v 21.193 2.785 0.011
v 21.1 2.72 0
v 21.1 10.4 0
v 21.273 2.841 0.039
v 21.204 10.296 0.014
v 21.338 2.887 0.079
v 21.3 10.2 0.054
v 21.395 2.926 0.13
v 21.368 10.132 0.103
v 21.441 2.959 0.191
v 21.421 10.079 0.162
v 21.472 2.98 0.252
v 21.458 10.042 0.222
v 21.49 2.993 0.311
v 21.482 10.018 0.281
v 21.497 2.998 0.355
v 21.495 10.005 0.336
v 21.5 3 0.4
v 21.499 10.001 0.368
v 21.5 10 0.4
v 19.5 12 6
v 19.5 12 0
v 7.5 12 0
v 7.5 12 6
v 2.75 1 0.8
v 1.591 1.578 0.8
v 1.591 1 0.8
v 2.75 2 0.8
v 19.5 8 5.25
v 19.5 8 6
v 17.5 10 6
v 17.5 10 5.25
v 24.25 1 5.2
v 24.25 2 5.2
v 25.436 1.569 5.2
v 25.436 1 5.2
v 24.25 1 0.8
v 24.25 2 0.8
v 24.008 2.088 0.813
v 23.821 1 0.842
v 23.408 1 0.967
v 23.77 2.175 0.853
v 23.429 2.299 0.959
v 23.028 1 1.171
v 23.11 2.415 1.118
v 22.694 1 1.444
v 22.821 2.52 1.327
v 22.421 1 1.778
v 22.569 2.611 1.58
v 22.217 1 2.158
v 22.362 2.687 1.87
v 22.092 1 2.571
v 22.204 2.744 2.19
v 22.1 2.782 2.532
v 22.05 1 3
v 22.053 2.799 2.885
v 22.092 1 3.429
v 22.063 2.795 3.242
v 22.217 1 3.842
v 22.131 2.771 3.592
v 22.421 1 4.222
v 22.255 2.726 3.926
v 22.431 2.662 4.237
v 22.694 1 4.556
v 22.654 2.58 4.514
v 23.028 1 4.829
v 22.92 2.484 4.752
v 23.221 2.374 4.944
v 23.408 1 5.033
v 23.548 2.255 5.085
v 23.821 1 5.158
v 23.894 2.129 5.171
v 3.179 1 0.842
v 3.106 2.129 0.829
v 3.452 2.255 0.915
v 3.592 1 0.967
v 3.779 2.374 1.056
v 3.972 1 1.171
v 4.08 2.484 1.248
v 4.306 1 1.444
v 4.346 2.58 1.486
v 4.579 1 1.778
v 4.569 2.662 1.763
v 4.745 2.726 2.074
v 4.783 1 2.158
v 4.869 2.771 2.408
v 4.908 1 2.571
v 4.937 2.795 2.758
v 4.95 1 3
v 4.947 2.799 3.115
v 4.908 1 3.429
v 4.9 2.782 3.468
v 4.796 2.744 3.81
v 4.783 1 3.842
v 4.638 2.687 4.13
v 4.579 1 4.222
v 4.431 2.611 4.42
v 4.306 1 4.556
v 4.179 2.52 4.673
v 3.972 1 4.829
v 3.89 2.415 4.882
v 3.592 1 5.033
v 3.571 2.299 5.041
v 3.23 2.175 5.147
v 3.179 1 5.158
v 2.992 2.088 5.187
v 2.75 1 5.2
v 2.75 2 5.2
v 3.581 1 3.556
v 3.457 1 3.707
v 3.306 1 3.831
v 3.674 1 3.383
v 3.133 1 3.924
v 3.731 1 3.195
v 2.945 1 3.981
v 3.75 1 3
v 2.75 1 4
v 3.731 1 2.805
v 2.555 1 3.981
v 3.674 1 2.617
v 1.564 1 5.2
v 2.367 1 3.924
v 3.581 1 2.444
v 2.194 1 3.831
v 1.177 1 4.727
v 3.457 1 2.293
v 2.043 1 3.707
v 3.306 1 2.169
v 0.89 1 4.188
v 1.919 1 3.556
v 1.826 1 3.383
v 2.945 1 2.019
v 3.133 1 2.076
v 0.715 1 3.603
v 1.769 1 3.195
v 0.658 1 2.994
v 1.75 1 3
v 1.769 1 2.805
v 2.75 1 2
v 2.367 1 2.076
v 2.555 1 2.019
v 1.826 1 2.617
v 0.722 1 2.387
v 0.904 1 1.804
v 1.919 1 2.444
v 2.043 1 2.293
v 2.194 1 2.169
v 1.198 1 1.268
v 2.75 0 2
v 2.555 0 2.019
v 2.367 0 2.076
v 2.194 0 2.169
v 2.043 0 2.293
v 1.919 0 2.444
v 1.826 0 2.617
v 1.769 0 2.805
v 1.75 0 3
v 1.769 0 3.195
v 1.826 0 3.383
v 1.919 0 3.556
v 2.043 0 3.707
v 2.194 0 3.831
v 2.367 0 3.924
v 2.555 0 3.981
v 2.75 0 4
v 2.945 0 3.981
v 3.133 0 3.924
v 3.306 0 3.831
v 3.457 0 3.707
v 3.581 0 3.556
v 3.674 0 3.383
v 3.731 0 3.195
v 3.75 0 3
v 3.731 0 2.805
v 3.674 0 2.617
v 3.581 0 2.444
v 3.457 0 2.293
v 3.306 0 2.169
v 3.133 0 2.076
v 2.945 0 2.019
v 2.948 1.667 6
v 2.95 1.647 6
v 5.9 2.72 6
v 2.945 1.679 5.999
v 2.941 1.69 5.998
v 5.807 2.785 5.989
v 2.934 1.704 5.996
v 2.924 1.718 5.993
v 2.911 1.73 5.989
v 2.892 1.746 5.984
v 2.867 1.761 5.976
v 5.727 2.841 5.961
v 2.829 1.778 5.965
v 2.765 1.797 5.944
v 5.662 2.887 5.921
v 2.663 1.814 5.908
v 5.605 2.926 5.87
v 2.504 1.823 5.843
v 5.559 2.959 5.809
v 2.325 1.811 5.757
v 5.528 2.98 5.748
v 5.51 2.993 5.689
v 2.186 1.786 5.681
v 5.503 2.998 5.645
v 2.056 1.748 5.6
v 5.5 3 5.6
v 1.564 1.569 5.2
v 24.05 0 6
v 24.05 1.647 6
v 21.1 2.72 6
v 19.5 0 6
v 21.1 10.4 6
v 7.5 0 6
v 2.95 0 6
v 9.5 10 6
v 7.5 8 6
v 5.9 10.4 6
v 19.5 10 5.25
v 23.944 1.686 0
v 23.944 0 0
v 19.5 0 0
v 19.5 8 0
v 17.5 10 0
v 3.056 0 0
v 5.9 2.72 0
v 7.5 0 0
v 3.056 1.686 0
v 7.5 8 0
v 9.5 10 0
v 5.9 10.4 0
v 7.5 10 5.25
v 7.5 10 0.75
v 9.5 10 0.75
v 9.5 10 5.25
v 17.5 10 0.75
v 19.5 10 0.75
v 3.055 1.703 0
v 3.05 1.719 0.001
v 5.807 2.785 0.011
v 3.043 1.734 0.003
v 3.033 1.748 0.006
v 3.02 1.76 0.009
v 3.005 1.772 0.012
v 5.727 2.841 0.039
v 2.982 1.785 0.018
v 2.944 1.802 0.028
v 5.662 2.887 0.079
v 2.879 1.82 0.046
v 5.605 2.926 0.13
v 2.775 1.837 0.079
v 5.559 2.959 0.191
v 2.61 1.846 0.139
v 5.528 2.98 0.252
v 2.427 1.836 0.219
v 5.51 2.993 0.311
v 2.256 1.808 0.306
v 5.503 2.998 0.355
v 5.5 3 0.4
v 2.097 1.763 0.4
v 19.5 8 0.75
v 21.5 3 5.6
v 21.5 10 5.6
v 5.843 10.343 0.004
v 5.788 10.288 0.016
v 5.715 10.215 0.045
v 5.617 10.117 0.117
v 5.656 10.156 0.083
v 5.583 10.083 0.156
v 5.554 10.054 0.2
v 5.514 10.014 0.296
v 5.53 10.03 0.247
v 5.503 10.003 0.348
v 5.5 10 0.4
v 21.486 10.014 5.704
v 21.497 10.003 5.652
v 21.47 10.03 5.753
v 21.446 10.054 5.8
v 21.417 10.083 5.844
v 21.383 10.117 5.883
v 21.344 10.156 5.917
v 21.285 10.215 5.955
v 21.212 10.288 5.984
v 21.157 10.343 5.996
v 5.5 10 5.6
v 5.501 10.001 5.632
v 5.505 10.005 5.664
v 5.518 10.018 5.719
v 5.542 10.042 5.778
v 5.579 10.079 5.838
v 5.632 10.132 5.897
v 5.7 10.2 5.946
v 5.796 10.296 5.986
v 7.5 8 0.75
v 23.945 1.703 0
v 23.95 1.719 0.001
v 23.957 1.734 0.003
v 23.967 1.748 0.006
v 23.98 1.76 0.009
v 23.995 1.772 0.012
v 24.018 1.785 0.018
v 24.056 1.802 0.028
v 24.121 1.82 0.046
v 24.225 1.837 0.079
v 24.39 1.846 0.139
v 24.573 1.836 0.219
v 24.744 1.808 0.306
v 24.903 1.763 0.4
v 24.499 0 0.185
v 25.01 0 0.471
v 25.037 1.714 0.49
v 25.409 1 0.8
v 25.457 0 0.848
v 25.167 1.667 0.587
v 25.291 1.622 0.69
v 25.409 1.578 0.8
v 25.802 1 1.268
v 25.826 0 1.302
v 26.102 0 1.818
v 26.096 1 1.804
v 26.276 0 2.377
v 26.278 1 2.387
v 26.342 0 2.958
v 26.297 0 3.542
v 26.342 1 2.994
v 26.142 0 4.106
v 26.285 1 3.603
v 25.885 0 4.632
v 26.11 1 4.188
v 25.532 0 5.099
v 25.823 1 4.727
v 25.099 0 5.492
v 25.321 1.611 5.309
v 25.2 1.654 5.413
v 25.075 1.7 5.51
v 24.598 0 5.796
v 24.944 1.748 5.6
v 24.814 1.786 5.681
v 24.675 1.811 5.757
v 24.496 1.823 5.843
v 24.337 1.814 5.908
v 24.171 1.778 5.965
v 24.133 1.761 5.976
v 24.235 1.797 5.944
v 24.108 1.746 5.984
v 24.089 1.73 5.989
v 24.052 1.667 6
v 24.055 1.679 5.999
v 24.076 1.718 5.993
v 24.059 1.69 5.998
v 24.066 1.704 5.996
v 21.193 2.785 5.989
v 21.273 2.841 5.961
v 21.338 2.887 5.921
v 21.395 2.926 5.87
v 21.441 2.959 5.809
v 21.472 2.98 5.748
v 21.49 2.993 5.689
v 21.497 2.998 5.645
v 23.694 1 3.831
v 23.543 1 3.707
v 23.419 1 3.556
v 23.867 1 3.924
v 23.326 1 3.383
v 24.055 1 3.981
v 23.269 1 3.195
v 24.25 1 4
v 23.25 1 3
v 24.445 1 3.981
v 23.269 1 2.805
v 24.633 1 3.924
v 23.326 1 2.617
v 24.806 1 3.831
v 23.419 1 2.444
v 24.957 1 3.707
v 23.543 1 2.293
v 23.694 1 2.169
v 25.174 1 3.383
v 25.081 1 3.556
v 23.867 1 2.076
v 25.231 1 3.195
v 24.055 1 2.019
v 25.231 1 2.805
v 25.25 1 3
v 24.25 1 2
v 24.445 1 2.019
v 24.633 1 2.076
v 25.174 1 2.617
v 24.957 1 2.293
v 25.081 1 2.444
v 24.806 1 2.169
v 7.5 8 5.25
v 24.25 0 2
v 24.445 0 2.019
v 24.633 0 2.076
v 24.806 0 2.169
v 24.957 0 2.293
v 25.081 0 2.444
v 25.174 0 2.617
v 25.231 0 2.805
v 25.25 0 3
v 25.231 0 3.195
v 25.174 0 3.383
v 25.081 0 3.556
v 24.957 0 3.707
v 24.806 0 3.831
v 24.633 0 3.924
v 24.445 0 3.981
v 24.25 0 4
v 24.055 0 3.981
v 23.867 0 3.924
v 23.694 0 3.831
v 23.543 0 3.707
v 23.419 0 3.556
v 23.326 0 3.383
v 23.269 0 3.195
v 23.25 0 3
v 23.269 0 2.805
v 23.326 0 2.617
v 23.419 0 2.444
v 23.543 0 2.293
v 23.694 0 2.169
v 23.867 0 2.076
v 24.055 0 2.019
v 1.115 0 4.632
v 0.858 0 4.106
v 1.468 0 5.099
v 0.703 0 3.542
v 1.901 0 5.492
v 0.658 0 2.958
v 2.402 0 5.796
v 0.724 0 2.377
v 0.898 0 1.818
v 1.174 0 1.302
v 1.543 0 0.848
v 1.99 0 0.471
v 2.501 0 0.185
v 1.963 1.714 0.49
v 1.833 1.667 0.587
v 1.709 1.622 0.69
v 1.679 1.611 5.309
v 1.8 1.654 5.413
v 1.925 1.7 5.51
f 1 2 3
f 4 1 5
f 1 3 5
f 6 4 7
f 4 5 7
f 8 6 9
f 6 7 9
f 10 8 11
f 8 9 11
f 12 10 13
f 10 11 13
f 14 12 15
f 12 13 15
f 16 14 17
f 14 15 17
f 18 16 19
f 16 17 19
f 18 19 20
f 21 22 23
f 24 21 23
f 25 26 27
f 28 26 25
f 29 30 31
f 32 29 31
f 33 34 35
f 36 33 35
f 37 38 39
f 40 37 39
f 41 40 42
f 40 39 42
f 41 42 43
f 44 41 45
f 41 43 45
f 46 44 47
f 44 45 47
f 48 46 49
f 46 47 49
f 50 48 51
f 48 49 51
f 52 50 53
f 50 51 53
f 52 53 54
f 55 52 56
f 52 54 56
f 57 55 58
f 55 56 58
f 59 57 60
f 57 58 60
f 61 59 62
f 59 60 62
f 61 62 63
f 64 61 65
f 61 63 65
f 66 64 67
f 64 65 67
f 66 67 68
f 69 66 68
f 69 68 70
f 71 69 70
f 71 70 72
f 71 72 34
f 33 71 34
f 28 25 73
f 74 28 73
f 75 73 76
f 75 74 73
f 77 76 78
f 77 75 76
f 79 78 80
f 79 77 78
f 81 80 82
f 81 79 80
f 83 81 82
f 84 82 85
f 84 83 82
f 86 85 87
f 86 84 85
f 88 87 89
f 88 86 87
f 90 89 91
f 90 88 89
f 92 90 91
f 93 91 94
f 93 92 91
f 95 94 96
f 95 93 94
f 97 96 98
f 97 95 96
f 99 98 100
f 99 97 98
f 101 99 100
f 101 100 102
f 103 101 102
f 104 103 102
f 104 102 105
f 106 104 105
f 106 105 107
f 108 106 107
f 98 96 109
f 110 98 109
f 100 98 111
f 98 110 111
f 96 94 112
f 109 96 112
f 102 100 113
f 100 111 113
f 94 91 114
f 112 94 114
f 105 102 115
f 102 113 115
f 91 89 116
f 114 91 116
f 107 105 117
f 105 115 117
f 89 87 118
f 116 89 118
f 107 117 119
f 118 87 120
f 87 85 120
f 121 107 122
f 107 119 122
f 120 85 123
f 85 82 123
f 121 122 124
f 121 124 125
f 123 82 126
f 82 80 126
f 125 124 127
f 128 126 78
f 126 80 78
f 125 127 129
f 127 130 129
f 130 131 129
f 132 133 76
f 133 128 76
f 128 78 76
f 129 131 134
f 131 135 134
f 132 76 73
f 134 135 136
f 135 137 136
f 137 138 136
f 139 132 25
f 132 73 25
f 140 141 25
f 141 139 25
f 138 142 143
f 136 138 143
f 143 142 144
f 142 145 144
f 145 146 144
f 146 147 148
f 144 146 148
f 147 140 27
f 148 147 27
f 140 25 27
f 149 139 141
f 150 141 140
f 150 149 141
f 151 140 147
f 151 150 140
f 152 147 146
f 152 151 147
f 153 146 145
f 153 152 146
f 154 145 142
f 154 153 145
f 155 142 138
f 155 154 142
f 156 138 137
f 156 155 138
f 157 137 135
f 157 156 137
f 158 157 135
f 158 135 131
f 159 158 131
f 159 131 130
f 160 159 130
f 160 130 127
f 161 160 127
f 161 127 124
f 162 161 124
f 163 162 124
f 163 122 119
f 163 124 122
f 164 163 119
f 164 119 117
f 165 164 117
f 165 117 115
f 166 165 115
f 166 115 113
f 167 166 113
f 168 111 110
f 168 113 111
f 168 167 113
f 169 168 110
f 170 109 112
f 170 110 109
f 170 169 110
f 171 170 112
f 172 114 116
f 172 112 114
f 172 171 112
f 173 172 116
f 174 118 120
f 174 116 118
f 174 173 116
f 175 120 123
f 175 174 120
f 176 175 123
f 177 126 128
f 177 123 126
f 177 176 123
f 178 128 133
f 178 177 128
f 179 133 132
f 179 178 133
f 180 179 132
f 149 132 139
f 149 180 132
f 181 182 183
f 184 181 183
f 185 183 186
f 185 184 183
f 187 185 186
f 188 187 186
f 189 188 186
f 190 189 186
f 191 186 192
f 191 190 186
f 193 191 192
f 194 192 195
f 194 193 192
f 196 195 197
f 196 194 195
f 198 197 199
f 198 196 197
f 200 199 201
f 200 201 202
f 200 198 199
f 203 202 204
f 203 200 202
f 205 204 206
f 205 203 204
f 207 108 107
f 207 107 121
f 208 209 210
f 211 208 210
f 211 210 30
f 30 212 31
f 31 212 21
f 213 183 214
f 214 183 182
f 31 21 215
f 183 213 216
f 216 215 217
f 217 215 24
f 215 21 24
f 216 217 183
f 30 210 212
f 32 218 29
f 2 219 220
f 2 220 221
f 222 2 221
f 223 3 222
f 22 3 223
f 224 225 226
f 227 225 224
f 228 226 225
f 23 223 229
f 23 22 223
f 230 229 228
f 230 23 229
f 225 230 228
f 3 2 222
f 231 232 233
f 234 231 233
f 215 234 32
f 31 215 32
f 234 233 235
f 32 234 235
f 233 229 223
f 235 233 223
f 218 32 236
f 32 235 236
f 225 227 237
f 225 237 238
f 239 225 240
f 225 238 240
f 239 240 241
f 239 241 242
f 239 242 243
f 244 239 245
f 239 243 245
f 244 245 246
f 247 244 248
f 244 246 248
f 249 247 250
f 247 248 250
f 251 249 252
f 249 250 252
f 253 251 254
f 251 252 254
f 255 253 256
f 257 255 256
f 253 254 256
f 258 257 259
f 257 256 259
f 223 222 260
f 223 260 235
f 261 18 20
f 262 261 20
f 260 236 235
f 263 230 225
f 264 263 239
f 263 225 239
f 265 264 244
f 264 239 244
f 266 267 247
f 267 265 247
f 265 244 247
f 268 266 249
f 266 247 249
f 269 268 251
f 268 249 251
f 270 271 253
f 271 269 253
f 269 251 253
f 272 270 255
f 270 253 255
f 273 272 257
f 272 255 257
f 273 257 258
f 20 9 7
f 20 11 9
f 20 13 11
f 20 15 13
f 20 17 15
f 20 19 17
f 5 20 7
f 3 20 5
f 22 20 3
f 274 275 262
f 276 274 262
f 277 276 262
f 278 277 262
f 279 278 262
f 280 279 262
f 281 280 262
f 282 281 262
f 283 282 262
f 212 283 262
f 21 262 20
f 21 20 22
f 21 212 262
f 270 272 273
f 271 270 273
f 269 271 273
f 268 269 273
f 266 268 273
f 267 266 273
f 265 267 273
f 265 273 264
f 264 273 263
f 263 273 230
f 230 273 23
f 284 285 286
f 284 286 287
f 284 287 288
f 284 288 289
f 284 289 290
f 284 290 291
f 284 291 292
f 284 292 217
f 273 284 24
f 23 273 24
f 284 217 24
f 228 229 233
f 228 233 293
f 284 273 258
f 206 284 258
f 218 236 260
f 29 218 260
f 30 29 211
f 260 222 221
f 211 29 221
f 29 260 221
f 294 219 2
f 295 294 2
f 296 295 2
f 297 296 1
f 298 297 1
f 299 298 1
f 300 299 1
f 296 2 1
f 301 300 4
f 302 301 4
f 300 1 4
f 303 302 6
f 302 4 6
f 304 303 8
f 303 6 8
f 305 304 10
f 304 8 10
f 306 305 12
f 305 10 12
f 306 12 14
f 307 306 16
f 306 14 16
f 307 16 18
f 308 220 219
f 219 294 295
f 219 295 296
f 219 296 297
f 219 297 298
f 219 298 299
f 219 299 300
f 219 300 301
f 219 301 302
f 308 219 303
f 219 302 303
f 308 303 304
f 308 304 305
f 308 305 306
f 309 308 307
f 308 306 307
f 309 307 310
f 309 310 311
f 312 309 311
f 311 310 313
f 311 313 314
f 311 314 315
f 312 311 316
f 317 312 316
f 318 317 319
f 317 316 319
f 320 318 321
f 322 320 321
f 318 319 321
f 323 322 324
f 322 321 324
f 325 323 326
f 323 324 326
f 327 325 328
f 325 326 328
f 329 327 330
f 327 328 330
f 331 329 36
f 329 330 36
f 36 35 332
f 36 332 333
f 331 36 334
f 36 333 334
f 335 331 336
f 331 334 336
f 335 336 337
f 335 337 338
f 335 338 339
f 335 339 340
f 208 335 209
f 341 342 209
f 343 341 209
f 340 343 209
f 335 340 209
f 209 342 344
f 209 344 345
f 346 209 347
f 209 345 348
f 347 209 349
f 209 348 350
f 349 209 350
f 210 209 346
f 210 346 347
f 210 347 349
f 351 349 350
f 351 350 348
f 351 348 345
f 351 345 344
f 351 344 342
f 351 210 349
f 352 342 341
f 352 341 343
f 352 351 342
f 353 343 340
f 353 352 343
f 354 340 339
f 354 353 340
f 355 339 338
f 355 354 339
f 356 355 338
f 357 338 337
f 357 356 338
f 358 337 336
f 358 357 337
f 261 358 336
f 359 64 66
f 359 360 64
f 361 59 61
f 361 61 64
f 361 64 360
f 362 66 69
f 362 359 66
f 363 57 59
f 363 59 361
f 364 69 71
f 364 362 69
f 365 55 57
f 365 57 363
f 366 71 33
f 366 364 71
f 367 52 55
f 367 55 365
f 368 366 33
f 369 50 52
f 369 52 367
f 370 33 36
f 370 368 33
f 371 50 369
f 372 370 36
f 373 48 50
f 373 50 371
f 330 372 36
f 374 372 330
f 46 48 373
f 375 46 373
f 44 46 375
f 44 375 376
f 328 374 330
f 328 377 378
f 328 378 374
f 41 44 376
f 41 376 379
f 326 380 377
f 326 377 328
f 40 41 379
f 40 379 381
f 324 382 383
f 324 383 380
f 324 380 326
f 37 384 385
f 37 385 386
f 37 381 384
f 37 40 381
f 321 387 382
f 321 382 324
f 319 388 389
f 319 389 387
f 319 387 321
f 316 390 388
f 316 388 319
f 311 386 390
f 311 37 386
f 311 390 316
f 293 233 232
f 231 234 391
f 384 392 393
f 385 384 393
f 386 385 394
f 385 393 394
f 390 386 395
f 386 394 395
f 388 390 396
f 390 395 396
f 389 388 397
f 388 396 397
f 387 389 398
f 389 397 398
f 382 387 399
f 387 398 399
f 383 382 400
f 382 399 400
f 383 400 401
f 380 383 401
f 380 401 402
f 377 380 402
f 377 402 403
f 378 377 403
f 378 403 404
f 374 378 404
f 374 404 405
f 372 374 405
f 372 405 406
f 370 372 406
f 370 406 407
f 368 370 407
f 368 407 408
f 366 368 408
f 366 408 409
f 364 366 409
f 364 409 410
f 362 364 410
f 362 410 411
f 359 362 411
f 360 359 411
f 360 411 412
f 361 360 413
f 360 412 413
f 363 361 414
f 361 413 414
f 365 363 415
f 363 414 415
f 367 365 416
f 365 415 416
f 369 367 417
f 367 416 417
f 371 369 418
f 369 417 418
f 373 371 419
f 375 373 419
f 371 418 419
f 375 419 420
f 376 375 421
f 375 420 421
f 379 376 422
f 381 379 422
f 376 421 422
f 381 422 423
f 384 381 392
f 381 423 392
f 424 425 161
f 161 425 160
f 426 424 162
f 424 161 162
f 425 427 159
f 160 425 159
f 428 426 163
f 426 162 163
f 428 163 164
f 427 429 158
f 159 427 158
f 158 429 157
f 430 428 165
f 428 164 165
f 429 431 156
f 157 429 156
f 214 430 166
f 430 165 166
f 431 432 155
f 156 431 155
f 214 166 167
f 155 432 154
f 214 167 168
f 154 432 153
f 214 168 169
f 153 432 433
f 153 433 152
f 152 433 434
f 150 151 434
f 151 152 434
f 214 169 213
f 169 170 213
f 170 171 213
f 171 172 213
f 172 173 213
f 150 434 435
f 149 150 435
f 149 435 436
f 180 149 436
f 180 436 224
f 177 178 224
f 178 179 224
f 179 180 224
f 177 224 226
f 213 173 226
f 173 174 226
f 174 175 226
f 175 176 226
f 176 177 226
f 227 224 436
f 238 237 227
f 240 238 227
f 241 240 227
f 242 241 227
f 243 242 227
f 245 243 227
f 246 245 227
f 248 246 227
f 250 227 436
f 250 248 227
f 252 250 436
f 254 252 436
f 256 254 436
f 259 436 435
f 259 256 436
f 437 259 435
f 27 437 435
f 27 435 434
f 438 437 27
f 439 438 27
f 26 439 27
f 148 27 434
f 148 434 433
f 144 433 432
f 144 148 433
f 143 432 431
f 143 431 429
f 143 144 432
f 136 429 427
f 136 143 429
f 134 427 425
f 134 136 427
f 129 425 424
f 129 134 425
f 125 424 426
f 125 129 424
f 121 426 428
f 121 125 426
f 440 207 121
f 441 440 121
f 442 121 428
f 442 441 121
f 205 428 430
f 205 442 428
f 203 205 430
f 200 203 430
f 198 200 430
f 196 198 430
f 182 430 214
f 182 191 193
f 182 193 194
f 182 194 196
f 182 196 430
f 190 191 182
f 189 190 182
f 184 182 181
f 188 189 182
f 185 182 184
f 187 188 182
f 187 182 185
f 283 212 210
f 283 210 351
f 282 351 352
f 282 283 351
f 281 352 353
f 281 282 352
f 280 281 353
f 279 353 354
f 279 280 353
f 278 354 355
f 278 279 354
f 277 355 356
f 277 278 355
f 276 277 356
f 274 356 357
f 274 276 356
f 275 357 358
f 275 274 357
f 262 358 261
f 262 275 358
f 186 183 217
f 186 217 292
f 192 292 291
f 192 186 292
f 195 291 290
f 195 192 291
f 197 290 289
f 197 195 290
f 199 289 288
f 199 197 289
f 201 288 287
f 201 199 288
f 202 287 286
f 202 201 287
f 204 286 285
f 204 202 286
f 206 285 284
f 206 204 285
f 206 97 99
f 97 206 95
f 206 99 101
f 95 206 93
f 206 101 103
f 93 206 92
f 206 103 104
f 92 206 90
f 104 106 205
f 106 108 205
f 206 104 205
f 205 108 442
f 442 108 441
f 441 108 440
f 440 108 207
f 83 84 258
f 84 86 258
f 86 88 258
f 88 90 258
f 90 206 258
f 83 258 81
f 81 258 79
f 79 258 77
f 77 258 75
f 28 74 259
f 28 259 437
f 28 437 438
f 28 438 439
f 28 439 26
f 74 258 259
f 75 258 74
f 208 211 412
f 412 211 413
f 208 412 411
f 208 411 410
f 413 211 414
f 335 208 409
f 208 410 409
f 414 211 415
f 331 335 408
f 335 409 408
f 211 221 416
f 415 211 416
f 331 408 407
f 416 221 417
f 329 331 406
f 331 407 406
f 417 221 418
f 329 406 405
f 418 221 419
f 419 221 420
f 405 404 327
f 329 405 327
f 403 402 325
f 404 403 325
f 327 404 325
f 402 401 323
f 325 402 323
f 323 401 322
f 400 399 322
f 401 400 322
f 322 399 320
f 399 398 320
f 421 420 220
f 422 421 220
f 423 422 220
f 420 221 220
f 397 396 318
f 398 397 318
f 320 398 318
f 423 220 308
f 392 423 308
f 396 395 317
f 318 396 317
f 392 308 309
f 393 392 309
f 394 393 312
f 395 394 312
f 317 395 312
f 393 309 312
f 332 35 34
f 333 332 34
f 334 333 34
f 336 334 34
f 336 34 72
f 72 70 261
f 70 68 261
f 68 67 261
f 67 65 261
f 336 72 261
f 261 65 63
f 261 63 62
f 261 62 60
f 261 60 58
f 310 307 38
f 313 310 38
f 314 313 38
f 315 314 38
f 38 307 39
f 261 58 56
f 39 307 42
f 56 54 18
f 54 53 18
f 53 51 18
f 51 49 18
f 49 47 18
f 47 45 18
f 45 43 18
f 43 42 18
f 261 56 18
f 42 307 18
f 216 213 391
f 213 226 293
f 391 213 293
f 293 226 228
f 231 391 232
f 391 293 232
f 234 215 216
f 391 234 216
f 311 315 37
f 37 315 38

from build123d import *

# Parameters (mm, degrees)
AUFSATZ_LINEAR_AUSTRAGEN1_DEPTH = 6
SKIZZE4_R                       = 1
SCHNITT_LINEAR_AUSTRAGEN1_DEPTH = 3
SCHNITT_LINEAR_AUSTRAGEN2_DEPTH = 2
VERRUNDUNG1_R                   = 0.4
SCHNITT_LINEAR_AUSTRAGEN4_DEPTH = 3
AUFSATZ_LINEAR_AUSTRAGEN2_DEPTH = 0.75
SCHNITT_LINEAR_AUSTRAGEN5_DEPTH = 6


with BuildPart() as part:
    # Skizze1 → Aufsatz-Linear austragen1 (new body)
    with BuildSketch(Plane.XY):
        Polygon((0, 0), (7.5, 0), (7.5, 10), (19.5, 10), (19.5, 0), (27, 0), (27, 1), (21.5, 3), (21.5, 12), (5.5, 12), (5.5, 3), (0, 1), align=None)
    extrude(amount=AUFSATZ_LINEAR_AUSTRAGEN1_DEPTH)

    # Skizze4 → Schnitt-Linear austragen1 (cut)
    with BuildSketch(Plane.XZ):
        with Locations(Location((24.25, 3, 0), (0, 0, 270))):
            Circle(SKIZZE4_R)
    schnitt_linear_austragen1 = extrude(amount=-SCHNITT_LINEAR_AUSTRAGEN1_DEPTH, mode=Mode.SUBTRACT)

    # Skizze5 → Schnitt-Linear austragen2 (cut)
    with BuildSketch(Plane(origin=(0, 3, 0), x_dir=(-1, 0, 0), z_dir=(0, -1, 0))):
        with BuildLine():
            Line((-24.25, -5.2), (-27, -5.2))
            Line((-27, -5.2), (-27, -0.8))
            Line((-27, -0.8), (-24.25, -0.8))
            ThreePointArc((-24.25, -0.8), (-22.05, -3), (-24.25, -5.2))
        make_face()
    schnitt_linear_austragen2 = extrude(amount=SCHNITT_LINEAR_AUSTRAGEN2_DEPTH, mode=Mode.SUBTRACT)

    # Spiegeln1: Schnitt-Linear austragen1, Schnitt-Linear austragen2 across plane
    add(schnitt_linear_austragen1.mirror(Plane(origin=(13.5, 0, 0), x_dir=(0, 0, 1), z_dir=(1, 0, 0))), mode=Mode.SUBTRACT)
    add(schnitt_linear_austragen2.mirror(Plane(origin=(13.5, 0, 0), x_dir=(0, 0, 1), z_dir=(1, 0, 0))), mode=Mode.SUBTRACT)

    # Verrundung1
    verrundung1_edges = [part.edges().sort_by_distance(p)[0] for p in [
        (2.75, 2, 0),
        (5.5, 7.5, 0),
        (21.5, 7.5, 0),
        (24.25, 2, 0),
        (24.25, 2, 6),
        (21.5, 7.5, 6),
        (5.5, 7.5, 6),
        (2.75, 2, 6),
    ]]
    fillet(verrundung1_edges, radius=VERRUNDUNG1_R)

    # Skizze7 → Schnitt-Linear austragen4 (cut)
    with BuildSketch(Plane(origin=(0, 3, 0), x_dir=(-1, 0, 0), z_dir=(0, -1, 0))):
        with BuildLine():
            Line((-24.05, -6), (-27.346568129, -6))
            Line((-27.346568129, -6), (-27.346568129, 0))
            Line((-27.346568129, 0), (-23.943800363, 0))
            ThreePointArc((-23.943800363, 0), (-26.341645128, -2.958498156), (-24.05, -6))
        make_face()
    schnitt_linear_austragen4 = extrude(amount=SCHNITT_LINEAR_AUSTRAGEN4_DEPTH, mode=Mode.SUBTRACT)

    # Spiegeln2: Schnitt-Linear austragen4 across plane
    add(schnitt_linear_austragen4.mirror(Plane(origin=(13.5, 0, 0), x_dir=(0, 0, 1), z_dir=(1, 0, 0))), mode=Mode.SUBTRACT)

    # Skizze8 → Aufsatz-Linear austragen2 (add)
    with BuildSketch(Plane.XY.offset(6)):
        Polygon((9.5, 10), (7.5, 8), (7.5, 10), align=None)
        Polygon((17.5, 10), (19.5, 10), (19.5, 8), align=None)
    aufsatz_linear_austragen2 = extrude(amount=-AUFSATZ_LINEAR_AUSTRAGEN2_DEPTH)

    # Spiegeln3: Aufsatz-Linear austragen2 across plane
    add(aufsatz_linear_austragen2.mirror(Plane.XY.offset(3)))

    # Skizze9 → Schnitt-Linear austragen5 (cut)
    with BuildSketch(Plane.XY.offset(6)):
        Polygon((5.5, 12), (5.5, 10), (7.5, 12), align=None)
    schnitt_linear_austragen5 = extrude(amount=-SCHNITT_LINEAR_AUSTRAGEN5_DEPTH, mode=Mode.SUBTRACT)

    # Spiegeln4: Schnitt-Linear austragen5 across plane
    add(schnitt_linear_austragen5.mirror(Plane(origin=(13.5, 0, 0), x_dir=(0, 0, 1), z_dir=(1, 0, 0))), mode=Mode.SUBTRACT)


solid = part.part
